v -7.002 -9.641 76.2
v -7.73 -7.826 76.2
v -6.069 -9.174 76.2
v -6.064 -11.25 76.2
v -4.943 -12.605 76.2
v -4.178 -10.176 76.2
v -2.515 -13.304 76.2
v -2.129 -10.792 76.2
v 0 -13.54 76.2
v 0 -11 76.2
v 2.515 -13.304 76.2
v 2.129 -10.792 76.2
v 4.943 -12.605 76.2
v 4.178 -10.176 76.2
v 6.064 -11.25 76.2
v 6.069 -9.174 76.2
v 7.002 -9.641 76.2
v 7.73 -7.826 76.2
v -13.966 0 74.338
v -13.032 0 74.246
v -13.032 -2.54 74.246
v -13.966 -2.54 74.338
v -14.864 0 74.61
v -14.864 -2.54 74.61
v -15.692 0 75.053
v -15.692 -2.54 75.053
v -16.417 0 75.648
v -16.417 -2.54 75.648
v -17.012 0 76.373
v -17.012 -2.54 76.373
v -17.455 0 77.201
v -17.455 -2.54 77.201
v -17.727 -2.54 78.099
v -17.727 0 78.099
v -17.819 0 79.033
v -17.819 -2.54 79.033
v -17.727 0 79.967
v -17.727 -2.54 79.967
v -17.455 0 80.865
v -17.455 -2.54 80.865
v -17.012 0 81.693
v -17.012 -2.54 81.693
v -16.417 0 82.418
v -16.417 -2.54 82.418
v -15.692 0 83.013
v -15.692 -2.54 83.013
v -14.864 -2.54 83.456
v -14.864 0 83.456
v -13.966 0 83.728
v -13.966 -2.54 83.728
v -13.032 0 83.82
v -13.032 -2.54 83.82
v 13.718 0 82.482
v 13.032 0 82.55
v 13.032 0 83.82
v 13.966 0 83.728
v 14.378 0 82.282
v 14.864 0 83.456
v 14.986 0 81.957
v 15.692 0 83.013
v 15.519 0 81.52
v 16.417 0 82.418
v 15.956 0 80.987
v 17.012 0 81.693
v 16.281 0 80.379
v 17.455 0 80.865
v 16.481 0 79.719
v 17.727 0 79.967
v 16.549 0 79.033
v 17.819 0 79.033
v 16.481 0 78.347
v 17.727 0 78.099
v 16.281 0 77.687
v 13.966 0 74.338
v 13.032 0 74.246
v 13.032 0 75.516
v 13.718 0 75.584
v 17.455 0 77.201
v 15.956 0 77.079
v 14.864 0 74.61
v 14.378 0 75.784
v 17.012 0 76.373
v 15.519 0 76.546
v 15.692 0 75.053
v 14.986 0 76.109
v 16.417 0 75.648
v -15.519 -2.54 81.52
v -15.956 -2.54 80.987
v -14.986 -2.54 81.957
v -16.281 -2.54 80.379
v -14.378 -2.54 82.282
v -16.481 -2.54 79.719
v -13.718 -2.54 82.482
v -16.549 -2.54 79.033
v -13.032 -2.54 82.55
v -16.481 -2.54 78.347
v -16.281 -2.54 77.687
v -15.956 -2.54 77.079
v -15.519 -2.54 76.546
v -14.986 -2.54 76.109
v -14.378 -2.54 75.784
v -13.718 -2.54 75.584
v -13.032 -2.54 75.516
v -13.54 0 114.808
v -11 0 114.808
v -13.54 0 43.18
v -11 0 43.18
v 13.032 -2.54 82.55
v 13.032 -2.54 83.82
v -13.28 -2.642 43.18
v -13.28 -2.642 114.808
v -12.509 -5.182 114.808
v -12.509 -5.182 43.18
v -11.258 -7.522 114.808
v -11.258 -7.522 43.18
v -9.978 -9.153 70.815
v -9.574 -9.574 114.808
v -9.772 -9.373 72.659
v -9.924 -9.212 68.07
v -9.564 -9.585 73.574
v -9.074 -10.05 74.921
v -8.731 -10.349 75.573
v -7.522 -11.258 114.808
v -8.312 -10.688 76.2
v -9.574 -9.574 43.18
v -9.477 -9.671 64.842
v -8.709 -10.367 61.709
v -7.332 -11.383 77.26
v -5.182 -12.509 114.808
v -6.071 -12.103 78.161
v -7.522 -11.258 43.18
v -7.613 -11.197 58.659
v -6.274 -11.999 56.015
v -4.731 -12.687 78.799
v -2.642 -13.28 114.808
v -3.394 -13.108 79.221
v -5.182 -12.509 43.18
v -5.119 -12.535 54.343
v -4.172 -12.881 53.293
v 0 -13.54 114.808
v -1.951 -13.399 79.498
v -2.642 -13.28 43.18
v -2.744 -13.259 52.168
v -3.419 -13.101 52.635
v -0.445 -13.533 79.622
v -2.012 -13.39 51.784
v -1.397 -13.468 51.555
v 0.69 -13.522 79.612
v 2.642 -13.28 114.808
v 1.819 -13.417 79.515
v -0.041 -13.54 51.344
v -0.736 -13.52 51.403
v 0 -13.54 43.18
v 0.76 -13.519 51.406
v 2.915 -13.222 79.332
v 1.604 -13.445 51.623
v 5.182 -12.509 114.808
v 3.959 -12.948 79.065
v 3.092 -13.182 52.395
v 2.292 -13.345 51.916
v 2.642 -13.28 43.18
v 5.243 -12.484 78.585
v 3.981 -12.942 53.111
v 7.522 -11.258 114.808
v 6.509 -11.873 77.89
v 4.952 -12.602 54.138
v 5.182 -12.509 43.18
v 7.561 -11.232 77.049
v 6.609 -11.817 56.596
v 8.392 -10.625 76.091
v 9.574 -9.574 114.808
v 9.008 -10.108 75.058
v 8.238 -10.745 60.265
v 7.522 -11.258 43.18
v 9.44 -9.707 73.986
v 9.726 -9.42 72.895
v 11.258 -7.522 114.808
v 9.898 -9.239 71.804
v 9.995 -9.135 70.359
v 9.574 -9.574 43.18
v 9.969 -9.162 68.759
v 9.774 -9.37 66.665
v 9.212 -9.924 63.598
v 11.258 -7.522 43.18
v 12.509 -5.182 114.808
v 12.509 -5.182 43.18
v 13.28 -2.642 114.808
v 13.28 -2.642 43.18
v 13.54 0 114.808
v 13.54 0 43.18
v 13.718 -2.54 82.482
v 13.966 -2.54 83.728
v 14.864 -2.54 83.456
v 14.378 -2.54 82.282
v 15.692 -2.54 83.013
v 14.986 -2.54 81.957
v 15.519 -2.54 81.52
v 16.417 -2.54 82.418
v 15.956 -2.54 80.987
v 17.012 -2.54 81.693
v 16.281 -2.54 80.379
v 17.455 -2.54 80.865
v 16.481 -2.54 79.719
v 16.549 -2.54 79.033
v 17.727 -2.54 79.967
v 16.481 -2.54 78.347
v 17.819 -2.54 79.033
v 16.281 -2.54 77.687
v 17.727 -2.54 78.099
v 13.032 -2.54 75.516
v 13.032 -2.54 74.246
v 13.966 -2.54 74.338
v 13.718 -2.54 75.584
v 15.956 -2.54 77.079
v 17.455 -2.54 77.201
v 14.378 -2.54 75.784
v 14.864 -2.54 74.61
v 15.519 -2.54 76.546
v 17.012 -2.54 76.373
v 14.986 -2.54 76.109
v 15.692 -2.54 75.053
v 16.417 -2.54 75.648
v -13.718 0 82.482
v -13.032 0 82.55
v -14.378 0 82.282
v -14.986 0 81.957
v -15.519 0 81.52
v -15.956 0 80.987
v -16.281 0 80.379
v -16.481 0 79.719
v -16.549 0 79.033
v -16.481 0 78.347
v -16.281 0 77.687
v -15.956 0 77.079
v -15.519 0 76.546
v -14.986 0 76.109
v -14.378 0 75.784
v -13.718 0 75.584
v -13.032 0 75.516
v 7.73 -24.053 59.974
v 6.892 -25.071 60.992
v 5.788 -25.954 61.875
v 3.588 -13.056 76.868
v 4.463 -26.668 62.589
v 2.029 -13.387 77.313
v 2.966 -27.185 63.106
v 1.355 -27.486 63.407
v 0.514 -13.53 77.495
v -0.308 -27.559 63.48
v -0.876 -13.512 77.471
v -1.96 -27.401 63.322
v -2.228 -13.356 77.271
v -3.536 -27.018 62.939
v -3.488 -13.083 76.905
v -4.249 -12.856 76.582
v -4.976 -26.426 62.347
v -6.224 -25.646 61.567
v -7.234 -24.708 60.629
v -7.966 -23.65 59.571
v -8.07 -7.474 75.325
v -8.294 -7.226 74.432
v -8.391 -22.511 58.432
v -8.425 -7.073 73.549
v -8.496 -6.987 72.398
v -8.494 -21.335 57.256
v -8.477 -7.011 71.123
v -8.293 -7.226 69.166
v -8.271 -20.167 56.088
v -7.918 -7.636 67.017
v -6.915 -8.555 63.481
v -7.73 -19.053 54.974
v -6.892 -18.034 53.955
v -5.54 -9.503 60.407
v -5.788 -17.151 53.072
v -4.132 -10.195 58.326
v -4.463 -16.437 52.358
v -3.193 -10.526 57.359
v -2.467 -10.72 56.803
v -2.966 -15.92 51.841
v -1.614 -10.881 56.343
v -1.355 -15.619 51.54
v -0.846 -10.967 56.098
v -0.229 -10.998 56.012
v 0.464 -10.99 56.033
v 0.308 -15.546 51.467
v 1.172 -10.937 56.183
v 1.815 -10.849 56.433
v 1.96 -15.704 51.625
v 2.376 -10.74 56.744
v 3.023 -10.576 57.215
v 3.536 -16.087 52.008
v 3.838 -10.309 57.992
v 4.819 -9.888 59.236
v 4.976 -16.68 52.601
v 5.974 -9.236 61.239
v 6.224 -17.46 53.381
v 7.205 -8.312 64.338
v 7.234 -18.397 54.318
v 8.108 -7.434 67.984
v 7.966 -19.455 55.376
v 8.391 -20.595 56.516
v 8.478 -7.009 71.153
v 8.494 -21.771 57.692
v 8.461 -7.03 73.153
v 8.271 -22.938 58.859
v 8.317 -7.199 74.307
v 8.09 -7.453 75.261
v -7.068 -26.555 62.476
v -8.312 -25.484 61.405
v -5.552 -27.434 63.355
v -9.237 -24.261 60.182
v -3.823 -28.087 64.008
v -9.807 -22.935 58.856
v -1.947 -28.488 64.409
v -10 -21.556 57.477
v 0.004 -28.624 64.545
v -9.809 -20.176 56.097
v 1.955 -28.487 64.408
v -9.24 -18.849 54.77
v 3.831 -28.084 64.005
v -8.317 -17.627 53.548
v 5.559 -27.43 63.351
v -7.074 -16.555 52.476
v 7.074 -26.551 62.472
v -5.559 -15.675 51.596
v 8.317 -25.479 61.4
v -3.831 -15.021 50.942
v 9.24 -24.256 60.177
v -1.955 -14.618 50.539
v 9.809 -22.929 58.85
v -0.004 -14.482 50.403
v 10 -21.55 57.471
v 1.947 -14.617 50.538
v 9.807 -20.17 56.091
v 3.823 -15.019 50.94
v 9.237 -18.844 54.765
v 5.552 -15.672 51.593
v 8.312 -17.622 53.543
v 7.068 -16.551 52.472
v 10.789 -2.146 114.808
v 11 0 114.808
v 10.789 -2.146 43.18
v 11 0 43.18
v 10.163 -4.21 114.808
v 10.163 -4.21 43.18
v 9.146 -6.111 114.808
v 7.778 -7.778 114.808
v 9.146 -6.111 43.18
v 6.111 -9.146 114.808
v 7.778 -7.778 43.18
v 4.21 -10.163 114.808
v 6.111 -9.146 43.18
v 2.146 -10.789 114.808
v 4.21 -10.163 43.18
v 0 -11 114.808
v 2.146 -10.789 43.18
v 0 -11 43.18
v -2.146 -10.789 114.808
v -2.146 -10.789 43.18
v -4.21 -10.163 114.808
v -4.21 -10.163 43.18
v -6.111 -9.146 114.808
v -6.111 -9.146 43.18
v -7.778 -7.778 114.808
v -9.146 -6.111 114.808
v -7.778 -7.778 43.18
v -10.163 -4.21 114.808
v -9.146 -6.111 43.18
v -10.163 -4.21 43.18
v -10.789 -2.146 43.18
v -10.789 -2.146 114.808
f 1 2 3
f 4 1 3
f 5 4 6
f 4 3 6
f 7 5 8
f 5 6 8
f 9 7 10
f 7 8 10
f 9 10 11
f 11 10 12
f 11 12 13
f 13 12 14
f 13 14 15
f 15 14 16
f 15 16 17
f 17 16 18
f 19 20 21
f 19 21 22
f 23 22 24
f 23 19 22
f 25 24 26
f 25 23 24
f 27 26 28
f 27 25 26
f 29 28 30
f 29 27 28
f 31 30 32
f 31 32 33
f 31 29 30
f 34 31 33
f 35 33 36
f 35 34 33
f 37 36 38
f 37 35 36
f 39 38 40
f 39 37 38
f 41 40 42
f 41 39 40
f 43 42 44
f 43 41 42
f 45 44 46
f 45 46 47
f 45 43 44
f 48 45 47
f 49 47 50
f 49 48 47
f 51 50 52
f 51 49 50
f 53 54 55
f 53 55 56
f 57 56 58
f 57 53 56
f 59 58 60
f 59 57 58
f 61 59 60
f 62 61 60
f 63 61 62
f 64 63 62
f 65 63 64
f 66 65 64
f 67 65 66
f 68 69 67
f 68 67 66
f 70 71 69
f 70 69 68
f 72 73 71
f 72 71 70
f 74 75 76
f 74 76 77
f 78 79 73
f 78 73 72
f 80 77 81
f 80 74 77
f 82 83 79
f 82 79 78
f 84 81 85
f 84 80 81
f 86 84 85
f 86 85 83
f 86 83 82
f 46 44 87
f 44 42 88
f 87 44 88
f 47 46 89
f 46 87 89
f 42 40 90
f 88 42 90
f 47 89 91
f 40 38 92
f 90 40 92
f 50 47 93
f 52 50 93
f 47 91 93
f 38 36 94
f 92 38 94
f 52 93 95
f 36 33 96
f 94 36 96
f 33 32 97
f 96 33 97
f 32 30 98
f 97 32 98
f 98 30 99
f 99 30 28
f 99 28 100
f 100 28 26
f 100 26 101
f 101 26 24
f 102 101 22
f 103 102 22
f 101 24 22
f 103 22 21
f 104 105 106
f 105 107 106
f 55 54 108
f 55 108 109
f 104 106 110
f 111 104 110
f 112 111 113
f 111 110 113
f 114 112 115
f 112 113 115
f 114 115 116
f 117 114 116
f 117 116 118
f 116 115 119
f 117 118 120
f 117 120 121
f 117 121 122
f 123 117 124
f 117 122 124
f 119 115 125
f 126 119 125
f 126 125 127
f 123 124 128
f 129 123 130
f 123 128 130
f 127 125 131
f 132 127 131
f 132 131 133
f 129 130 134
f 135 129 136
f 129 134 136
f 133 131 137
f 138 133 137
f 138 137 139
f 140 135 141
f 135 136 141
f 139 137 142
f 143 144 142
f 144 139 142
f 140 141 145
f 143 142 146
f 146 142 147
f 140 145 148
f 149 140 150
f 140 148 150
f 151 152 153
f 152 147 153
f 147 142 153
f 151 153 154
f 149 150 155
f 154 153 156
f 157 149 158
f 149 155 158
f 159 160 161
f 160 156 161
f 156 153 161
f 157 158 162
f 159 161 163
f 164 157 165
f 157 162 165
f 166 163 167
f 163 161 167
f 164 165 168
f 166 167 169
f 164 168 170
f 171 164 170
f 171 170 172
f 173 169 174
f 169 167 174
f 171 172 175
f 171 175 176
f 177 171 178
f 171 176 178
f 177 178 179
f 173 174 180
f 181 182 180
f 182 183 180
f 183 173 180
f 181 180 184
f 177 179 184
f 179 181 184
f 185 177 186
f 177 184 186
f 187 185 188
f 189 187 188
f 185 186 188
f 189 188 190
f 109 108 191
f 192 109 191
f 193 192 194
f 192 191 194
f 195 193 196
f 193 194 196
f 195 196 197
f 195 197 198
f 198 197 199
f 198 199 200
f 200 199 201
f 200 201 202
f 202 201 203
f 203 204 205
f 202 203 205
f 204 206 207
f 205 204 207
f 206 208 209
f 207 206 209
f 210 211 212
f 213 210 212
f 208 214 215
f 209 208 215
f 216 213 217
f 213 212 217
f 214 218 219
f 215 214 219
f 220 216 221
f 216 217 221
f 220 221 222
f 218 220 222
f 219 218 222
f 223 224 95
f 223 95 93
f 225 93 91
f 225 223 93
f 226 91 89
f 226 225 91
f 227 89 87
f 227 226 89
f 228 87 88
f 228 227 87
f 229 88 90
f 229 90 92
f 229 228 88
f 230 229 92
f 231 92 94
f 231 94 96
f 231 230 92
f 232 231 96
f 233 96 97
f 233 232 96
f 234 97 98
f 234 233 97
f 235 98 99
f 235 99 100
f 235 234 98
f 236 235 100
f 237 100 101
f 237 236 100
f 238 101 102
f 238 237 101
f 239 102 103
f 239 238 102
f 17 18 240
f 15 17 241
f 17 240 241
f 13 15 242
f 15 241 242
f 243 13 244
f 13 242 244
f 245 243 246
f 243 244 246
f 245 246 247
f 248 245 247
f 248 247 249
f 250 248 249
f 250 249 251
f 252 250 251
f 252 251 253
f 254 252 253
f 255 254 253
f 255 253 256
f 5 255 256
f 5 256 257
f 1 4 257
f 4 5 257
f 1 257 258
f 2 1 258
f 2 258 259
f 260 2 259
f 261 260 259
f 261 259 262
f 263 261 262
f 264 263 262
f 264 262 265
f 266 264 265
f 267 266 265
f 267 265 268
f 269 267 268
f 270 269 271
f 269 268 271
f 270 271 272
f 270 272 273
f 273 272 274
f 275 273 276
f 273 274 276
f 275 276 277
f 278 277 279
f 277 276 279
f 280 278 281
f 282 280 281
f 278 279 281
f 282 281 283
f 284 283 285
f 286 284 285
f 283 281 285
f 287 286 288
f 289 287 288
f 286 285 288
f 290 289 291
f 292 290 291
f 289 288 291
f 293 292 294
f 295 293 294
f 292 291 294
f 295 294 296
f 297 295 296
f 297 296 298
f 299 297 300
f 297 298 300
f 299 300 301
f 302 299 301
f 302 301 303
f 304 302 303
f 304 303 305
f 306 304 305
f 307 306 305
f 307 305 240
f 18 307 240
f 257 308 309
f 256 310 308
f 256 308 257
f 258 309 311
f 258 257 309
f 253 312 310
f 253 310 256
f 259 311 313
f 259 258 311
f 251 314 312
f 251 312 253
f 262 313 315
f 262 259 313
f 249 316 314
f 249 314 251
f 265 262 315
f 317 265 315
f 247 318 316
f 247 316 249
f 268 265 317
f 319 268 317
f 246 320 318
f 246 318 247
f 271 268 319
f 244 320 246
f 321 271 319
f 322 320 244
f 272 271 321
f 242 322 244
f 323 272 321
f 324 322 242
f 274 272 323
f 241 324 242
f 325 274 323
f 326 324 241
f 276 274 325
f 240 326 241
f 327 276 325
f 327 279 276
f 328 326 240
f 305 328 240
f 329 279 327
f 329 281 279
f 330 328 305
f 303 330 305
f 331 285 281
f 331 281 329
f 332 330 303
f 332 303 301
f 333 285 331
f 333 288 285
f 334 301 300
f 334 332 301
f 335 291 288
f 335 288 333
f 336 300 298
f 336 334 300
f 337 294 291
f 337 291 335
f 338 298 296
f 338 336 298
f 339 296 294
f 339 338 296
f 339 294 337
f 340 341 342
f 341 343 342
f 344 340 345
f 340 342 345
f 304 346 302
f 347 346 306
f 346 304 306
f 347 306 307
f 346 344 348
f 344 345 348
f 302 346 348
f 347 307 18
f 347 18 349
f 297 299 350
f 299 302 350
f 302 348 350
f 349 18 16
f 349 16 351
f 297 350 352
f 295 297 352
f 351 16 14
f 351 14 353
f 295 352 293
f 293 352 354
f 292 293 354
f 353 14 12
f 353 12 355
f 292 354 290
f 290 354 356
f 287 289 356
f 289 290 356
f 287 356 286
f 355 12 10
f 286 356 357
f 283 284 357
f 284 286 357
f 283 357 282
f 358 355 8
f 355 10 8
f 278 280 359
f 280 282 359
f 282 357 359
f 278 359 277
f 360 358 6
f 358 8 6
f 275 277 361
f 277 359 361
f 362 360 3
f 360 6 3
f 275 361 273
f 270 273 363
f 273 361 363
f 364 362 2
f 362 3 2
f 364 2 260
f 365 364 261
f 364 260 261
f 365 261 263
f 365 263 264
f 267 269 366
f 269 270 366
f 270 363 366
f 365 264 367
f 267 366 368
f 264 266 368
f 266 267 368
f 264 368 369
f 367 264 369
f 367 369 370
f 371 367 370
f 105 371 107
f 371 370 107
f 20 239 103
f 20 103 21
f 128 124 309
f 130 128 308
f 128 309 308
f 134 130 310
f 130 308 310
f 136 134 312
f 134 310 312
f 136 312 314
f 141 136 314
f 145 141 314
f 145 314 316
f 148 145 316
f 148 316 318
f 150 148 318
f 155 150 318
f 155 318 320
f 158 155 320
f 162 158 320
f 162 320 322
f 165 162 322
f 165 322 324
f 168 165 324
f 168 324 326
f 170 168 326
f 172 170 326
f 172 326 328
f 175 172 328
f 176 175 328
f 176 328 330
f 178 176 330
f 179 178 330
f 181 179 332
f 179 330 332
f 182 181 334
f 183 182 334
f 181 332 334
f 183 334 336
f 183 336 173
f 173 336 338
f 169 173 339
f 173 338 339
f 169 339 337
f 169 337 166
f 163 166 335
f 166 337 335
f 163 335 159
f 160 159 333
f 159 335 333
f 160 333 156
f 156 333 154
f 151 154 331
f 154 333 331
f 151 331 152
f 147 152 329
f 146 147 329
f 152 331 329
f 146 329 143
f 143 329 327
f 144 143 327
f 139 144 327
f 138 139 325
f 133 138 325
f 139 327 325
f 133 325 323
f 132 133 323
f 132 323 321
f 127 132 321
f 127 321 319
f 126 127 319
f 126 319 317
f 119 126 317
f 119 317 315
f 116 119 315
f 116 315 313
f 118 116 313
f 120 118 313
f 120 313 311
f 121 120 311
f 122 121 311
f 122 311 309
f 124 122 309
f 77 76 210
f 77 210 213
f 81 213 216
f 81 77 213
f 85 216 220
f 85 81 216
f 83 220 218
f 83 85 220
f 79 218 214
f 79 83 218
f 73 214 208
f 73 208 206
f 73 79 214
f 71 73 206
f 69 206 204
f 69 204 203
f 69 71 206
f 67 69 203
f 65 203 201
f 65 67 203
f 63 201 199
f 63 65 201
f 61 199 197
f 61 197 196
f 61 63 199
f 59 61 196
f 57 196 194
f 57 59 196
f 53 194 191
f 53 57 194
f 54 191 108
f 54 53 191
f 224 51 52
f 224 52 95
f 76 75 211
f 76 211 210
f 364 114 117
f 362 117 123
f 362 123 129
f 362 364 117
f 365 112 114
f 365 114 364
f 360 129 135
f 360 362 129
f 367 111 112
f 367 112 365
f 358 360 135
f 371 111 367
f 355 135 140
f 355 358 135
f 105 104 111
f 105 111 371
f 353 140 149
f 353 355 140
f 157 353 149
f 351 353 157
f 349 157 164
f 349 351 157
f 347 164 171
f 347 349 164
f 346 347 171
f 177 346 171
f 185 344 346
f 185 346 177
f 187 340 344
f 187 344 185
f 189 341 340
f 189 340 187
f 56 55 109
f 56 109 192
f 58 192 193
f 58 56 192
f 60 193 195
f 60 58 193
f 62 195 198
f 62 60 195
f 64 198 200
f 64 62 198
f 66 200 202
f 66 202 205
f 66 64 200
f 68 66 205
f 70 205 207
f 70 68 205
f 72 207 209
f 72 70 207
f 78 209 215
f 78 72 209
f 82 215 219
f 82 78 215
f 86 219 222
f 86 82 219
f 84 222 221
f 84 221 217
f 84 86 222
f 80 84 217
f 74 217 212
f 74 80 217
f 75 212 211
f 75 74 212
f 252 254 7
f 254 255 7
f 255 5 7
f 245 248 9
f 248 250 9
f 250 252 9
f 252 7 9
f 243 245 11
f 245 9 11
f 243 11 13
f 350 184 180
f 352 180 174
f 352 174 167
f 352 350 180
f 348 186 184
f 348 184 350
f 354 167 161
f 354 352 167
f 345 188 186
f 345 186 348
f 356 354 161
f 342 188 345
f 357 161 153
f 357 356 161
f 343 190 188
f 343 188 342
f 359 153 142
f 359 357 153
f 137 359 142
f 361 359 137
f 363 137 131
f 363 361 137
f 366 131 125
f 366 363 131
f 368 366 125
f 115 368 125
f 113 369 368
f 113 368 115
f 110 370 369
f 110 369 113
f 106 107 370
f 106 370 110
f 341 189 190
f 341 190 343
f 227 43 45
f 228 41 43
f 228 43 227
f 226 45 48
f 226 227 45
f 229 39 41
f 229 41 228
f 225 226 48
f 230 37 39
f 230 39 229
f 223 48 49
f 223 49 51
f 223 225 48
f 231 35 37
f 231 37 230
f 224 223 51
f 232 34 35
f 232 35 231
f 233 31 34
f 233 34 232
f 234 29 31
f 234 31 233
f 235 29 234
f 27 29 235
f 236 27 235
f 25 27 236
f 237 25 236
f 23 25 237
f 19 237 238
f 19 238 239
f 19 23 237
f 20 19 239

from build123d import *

# Parameters (mm, degrees)
BOSS_EXTRUDE1_DEPTH      = 76.2
BOSS_EXTRUDE4_REACH      = 80.569
BOSS_EXTRUDE4_END_RADIUS = 13.54
SKETCH4_R                = 10
SKETCH9_R                = 8.5
CUT_EXTRUDE4_DEPTH       = 94.242153775
CUT_EXTRUDE4_DEPTH_BACK  = 94.242153775
CUT_EXTRUDE5_DEPTH       = 43.18
BOSS_EXTRUDE5_DEPTH      = 25.4
BOSS_EXTRUDE6_DEPTH      = 2.54
BOSS_EXTRUDE6_2_DEPTH    = 2.54
SKETCH14_R               = 10
CUT_EXTRUDE6_DEPTH       = 25.4
BOSS_EXTRUDE7_DEPTH      = 13.208


with BuildPart() as part:
    # Sketch2 → Boss-Extrude1 (new body)
    with BuildSketch(Plane.XY):
        with BuildLine():
            Line((13.54, 0), (11, 0))
            ThreePointArc((11, 0), (0, -11), (-11, 0))
            Line((-11, 0), (-13.54, 0))
            ThreePointArc((-13.54, 0), (0, -13.54), (13.54, 0))
        make_face()
    extrude(amount=BOSS_EXTRUDE1_DEPTH)

    # Boss-Extrude4: up to this cylinder (the profile starts outside it)
    boss_extrude4_end = Plane(origin=(0, 0, 39.513127), z_dir=(0, 0, -1)) * Cylinder(BOSS_EXTRUDE4_END_RADIUS, 189.218, mode=Mode.PRIVATE)
    # Sketch4 → Boss-Extrude4 (add, up to the surface)
    with BuildSketch(Plane(origin=(0, 0, 0), x_dir=(-1, 0, 0), z_dir=(0, 0.7071067811865561, 0.7071067811865389)), mode=Mode.PRIVATE) as boss_extrude4_sk1:
        with Locations(Location((0, 55.88, 0), (0, 0, 33.774019763))):
            Circle(SKETCH4_R)
    boss_extrude4_tool1 = extrude(boss_extrude4_sk1.sketch, amount=BOSS_EXTRUDE4_REACH, mode=Mode.PRIVATE) - boss_extrude4_end
    add(boss_extrude4_tool1.solids().sort_by_distance((0, -39.513127, 39.513127))[0])

    # Sketch9 → Cut-Extrude4 (cut, two sides)
    with BuildSketch(Plane(origin=(0, 0, 0), x_dir=(-1, 0, 0), z_dir=(0, -0.7071067811865562, -0.7071067811865389))) as cut_extrude4_sk:
        with Locations(Location((0, -55.88, 0), (0, 0, 204.578729369))):
            Circle(SKETCH9_R)
    extrude(amount=CUT_EXTRUDE4_DEPTH, mode=Mode.SUBTRACT)
    extrude(cut_extrude4_sk.sketch, amount=-CUT_EXTRUDE4_DEPTH_BACK, mode=Mode.SUBTRACT)

    # Sketch10 → Cut-Extrude5 (cut)
    with BuildSketch(Plane(origin=(0, 0, 0), x_dir=(-1, 0, 0), z_dir=(0, 0, -1))):
        with BuildLine():
            Line((13.54, 0), (11, 0))
            ThreePointArc((11, 0), (0, -11), (-11, 0))
            Line((-11, 0), (-13.54, 0))
            ThreePointArc((-13.54, 0), (0, -13.54), (13.54, 0))
        make_face()
    extrude(amount=-CUT_EXTRUDE5_DEPTH, mode=Mode.SUBTRACT)

    # Sketch11 → Boss-Extrude5 (add)
    with BuildSketch(Plane.XY.offset(76.2)):
        with BuildLine():
            Line((13.54, 0), (11, 0))
            ThreePointArc((11, 0), (0, -11), (-11, 0))
            Line((-11, 0), (-13.54, 0))
            ThreePointArc((-13.54, 0), (0, -13.54), (13.54, 0))
        make_face()
    extrude(amount=BOSS_EXTRUDE5_DEPTH)

    # Sketch14 → Cut-Extrude6 (cut)
    with BuildSketch(Plane(origin=(0, 0, 0), x_dir=(1, 0, 0), z_dir=(0, -0.7071067811865562, -0.7071067811865389))):
        with Locations(Location((0, 55.88, 0), (0, 0, 270))):
            Circle(SKETCH14_R)
    extrude(amount=-CUT_EXTRUDE6_DEPTH, mode=Mode.SUBTRACT)

    # Sketch15 → Boss-Extrude7 (add)
    with BuildSketch(Plane.XY.offset(101.6)):
        with BuildLine():
            Line((13.54, 0), (11, 0))
            ThreePointArc((11, 0), (0, -11), (-11, 0))
            Line((-11, 0), (-13.54, 0))
            ThreePointArc((-13.54, 0), (0, -13.54), (13.54, 0))
        make_face()
    extrude(amount=BOSS_EXTRUDE7_DEPTH)


with BuildPart() as body_2:
    # Sketch12 → Boss-Extrude6 (new body)
    with BuildSketch(Plane(origin=(0, 0, 0), x_dir=(1, 0, 0), z_dir=(0, 1, 0))):
        with BuildLine():
            Line((-13.032, -83.82), (-13.032, -82.55))
            ThreePointArc((-13.032, -82.55), (-16.54899091, -79.03300909), (-13.032, -75.51601818))
            Line((-13.032, -75.51601818), (-13.032, -74.24601818))
            ThreePointArc((-13.032, -74.24601818), (-17.81899091, -79.03300909), (-13.032, -83.82))
        make_face()
    extrude(amount=-BOSS_EXTRUDE6_DEPTH)


with BuildPart() as body_3:
    # Sketch12 → Boss-Extrude6 2 (new body)
    with BuildSketch(Plane(origin=(0, 0, 0), x_dir=(1, 0, 0), z_dir=(0, 1, 0))):
        with BuildLine():
            Line((13.032, -74.24601818), (13.032, -75.51601818))
            ThreePointArc((13.032, -75.51601818), (16.54899091, -79.03300909), (13.032, -82.55))
            Line((13.032, -82.55), (13.032, -83.82))
            ThreePointArc((13.032, -83.82), (17.81899091, -79.03300909), (13.032, -74.24601818))
        make_face()
    extrude(amount=-BOSS_EXTRUDE6_2_DEPTH)


solid = Compound([part.part, body_2.part, body_3.part])
